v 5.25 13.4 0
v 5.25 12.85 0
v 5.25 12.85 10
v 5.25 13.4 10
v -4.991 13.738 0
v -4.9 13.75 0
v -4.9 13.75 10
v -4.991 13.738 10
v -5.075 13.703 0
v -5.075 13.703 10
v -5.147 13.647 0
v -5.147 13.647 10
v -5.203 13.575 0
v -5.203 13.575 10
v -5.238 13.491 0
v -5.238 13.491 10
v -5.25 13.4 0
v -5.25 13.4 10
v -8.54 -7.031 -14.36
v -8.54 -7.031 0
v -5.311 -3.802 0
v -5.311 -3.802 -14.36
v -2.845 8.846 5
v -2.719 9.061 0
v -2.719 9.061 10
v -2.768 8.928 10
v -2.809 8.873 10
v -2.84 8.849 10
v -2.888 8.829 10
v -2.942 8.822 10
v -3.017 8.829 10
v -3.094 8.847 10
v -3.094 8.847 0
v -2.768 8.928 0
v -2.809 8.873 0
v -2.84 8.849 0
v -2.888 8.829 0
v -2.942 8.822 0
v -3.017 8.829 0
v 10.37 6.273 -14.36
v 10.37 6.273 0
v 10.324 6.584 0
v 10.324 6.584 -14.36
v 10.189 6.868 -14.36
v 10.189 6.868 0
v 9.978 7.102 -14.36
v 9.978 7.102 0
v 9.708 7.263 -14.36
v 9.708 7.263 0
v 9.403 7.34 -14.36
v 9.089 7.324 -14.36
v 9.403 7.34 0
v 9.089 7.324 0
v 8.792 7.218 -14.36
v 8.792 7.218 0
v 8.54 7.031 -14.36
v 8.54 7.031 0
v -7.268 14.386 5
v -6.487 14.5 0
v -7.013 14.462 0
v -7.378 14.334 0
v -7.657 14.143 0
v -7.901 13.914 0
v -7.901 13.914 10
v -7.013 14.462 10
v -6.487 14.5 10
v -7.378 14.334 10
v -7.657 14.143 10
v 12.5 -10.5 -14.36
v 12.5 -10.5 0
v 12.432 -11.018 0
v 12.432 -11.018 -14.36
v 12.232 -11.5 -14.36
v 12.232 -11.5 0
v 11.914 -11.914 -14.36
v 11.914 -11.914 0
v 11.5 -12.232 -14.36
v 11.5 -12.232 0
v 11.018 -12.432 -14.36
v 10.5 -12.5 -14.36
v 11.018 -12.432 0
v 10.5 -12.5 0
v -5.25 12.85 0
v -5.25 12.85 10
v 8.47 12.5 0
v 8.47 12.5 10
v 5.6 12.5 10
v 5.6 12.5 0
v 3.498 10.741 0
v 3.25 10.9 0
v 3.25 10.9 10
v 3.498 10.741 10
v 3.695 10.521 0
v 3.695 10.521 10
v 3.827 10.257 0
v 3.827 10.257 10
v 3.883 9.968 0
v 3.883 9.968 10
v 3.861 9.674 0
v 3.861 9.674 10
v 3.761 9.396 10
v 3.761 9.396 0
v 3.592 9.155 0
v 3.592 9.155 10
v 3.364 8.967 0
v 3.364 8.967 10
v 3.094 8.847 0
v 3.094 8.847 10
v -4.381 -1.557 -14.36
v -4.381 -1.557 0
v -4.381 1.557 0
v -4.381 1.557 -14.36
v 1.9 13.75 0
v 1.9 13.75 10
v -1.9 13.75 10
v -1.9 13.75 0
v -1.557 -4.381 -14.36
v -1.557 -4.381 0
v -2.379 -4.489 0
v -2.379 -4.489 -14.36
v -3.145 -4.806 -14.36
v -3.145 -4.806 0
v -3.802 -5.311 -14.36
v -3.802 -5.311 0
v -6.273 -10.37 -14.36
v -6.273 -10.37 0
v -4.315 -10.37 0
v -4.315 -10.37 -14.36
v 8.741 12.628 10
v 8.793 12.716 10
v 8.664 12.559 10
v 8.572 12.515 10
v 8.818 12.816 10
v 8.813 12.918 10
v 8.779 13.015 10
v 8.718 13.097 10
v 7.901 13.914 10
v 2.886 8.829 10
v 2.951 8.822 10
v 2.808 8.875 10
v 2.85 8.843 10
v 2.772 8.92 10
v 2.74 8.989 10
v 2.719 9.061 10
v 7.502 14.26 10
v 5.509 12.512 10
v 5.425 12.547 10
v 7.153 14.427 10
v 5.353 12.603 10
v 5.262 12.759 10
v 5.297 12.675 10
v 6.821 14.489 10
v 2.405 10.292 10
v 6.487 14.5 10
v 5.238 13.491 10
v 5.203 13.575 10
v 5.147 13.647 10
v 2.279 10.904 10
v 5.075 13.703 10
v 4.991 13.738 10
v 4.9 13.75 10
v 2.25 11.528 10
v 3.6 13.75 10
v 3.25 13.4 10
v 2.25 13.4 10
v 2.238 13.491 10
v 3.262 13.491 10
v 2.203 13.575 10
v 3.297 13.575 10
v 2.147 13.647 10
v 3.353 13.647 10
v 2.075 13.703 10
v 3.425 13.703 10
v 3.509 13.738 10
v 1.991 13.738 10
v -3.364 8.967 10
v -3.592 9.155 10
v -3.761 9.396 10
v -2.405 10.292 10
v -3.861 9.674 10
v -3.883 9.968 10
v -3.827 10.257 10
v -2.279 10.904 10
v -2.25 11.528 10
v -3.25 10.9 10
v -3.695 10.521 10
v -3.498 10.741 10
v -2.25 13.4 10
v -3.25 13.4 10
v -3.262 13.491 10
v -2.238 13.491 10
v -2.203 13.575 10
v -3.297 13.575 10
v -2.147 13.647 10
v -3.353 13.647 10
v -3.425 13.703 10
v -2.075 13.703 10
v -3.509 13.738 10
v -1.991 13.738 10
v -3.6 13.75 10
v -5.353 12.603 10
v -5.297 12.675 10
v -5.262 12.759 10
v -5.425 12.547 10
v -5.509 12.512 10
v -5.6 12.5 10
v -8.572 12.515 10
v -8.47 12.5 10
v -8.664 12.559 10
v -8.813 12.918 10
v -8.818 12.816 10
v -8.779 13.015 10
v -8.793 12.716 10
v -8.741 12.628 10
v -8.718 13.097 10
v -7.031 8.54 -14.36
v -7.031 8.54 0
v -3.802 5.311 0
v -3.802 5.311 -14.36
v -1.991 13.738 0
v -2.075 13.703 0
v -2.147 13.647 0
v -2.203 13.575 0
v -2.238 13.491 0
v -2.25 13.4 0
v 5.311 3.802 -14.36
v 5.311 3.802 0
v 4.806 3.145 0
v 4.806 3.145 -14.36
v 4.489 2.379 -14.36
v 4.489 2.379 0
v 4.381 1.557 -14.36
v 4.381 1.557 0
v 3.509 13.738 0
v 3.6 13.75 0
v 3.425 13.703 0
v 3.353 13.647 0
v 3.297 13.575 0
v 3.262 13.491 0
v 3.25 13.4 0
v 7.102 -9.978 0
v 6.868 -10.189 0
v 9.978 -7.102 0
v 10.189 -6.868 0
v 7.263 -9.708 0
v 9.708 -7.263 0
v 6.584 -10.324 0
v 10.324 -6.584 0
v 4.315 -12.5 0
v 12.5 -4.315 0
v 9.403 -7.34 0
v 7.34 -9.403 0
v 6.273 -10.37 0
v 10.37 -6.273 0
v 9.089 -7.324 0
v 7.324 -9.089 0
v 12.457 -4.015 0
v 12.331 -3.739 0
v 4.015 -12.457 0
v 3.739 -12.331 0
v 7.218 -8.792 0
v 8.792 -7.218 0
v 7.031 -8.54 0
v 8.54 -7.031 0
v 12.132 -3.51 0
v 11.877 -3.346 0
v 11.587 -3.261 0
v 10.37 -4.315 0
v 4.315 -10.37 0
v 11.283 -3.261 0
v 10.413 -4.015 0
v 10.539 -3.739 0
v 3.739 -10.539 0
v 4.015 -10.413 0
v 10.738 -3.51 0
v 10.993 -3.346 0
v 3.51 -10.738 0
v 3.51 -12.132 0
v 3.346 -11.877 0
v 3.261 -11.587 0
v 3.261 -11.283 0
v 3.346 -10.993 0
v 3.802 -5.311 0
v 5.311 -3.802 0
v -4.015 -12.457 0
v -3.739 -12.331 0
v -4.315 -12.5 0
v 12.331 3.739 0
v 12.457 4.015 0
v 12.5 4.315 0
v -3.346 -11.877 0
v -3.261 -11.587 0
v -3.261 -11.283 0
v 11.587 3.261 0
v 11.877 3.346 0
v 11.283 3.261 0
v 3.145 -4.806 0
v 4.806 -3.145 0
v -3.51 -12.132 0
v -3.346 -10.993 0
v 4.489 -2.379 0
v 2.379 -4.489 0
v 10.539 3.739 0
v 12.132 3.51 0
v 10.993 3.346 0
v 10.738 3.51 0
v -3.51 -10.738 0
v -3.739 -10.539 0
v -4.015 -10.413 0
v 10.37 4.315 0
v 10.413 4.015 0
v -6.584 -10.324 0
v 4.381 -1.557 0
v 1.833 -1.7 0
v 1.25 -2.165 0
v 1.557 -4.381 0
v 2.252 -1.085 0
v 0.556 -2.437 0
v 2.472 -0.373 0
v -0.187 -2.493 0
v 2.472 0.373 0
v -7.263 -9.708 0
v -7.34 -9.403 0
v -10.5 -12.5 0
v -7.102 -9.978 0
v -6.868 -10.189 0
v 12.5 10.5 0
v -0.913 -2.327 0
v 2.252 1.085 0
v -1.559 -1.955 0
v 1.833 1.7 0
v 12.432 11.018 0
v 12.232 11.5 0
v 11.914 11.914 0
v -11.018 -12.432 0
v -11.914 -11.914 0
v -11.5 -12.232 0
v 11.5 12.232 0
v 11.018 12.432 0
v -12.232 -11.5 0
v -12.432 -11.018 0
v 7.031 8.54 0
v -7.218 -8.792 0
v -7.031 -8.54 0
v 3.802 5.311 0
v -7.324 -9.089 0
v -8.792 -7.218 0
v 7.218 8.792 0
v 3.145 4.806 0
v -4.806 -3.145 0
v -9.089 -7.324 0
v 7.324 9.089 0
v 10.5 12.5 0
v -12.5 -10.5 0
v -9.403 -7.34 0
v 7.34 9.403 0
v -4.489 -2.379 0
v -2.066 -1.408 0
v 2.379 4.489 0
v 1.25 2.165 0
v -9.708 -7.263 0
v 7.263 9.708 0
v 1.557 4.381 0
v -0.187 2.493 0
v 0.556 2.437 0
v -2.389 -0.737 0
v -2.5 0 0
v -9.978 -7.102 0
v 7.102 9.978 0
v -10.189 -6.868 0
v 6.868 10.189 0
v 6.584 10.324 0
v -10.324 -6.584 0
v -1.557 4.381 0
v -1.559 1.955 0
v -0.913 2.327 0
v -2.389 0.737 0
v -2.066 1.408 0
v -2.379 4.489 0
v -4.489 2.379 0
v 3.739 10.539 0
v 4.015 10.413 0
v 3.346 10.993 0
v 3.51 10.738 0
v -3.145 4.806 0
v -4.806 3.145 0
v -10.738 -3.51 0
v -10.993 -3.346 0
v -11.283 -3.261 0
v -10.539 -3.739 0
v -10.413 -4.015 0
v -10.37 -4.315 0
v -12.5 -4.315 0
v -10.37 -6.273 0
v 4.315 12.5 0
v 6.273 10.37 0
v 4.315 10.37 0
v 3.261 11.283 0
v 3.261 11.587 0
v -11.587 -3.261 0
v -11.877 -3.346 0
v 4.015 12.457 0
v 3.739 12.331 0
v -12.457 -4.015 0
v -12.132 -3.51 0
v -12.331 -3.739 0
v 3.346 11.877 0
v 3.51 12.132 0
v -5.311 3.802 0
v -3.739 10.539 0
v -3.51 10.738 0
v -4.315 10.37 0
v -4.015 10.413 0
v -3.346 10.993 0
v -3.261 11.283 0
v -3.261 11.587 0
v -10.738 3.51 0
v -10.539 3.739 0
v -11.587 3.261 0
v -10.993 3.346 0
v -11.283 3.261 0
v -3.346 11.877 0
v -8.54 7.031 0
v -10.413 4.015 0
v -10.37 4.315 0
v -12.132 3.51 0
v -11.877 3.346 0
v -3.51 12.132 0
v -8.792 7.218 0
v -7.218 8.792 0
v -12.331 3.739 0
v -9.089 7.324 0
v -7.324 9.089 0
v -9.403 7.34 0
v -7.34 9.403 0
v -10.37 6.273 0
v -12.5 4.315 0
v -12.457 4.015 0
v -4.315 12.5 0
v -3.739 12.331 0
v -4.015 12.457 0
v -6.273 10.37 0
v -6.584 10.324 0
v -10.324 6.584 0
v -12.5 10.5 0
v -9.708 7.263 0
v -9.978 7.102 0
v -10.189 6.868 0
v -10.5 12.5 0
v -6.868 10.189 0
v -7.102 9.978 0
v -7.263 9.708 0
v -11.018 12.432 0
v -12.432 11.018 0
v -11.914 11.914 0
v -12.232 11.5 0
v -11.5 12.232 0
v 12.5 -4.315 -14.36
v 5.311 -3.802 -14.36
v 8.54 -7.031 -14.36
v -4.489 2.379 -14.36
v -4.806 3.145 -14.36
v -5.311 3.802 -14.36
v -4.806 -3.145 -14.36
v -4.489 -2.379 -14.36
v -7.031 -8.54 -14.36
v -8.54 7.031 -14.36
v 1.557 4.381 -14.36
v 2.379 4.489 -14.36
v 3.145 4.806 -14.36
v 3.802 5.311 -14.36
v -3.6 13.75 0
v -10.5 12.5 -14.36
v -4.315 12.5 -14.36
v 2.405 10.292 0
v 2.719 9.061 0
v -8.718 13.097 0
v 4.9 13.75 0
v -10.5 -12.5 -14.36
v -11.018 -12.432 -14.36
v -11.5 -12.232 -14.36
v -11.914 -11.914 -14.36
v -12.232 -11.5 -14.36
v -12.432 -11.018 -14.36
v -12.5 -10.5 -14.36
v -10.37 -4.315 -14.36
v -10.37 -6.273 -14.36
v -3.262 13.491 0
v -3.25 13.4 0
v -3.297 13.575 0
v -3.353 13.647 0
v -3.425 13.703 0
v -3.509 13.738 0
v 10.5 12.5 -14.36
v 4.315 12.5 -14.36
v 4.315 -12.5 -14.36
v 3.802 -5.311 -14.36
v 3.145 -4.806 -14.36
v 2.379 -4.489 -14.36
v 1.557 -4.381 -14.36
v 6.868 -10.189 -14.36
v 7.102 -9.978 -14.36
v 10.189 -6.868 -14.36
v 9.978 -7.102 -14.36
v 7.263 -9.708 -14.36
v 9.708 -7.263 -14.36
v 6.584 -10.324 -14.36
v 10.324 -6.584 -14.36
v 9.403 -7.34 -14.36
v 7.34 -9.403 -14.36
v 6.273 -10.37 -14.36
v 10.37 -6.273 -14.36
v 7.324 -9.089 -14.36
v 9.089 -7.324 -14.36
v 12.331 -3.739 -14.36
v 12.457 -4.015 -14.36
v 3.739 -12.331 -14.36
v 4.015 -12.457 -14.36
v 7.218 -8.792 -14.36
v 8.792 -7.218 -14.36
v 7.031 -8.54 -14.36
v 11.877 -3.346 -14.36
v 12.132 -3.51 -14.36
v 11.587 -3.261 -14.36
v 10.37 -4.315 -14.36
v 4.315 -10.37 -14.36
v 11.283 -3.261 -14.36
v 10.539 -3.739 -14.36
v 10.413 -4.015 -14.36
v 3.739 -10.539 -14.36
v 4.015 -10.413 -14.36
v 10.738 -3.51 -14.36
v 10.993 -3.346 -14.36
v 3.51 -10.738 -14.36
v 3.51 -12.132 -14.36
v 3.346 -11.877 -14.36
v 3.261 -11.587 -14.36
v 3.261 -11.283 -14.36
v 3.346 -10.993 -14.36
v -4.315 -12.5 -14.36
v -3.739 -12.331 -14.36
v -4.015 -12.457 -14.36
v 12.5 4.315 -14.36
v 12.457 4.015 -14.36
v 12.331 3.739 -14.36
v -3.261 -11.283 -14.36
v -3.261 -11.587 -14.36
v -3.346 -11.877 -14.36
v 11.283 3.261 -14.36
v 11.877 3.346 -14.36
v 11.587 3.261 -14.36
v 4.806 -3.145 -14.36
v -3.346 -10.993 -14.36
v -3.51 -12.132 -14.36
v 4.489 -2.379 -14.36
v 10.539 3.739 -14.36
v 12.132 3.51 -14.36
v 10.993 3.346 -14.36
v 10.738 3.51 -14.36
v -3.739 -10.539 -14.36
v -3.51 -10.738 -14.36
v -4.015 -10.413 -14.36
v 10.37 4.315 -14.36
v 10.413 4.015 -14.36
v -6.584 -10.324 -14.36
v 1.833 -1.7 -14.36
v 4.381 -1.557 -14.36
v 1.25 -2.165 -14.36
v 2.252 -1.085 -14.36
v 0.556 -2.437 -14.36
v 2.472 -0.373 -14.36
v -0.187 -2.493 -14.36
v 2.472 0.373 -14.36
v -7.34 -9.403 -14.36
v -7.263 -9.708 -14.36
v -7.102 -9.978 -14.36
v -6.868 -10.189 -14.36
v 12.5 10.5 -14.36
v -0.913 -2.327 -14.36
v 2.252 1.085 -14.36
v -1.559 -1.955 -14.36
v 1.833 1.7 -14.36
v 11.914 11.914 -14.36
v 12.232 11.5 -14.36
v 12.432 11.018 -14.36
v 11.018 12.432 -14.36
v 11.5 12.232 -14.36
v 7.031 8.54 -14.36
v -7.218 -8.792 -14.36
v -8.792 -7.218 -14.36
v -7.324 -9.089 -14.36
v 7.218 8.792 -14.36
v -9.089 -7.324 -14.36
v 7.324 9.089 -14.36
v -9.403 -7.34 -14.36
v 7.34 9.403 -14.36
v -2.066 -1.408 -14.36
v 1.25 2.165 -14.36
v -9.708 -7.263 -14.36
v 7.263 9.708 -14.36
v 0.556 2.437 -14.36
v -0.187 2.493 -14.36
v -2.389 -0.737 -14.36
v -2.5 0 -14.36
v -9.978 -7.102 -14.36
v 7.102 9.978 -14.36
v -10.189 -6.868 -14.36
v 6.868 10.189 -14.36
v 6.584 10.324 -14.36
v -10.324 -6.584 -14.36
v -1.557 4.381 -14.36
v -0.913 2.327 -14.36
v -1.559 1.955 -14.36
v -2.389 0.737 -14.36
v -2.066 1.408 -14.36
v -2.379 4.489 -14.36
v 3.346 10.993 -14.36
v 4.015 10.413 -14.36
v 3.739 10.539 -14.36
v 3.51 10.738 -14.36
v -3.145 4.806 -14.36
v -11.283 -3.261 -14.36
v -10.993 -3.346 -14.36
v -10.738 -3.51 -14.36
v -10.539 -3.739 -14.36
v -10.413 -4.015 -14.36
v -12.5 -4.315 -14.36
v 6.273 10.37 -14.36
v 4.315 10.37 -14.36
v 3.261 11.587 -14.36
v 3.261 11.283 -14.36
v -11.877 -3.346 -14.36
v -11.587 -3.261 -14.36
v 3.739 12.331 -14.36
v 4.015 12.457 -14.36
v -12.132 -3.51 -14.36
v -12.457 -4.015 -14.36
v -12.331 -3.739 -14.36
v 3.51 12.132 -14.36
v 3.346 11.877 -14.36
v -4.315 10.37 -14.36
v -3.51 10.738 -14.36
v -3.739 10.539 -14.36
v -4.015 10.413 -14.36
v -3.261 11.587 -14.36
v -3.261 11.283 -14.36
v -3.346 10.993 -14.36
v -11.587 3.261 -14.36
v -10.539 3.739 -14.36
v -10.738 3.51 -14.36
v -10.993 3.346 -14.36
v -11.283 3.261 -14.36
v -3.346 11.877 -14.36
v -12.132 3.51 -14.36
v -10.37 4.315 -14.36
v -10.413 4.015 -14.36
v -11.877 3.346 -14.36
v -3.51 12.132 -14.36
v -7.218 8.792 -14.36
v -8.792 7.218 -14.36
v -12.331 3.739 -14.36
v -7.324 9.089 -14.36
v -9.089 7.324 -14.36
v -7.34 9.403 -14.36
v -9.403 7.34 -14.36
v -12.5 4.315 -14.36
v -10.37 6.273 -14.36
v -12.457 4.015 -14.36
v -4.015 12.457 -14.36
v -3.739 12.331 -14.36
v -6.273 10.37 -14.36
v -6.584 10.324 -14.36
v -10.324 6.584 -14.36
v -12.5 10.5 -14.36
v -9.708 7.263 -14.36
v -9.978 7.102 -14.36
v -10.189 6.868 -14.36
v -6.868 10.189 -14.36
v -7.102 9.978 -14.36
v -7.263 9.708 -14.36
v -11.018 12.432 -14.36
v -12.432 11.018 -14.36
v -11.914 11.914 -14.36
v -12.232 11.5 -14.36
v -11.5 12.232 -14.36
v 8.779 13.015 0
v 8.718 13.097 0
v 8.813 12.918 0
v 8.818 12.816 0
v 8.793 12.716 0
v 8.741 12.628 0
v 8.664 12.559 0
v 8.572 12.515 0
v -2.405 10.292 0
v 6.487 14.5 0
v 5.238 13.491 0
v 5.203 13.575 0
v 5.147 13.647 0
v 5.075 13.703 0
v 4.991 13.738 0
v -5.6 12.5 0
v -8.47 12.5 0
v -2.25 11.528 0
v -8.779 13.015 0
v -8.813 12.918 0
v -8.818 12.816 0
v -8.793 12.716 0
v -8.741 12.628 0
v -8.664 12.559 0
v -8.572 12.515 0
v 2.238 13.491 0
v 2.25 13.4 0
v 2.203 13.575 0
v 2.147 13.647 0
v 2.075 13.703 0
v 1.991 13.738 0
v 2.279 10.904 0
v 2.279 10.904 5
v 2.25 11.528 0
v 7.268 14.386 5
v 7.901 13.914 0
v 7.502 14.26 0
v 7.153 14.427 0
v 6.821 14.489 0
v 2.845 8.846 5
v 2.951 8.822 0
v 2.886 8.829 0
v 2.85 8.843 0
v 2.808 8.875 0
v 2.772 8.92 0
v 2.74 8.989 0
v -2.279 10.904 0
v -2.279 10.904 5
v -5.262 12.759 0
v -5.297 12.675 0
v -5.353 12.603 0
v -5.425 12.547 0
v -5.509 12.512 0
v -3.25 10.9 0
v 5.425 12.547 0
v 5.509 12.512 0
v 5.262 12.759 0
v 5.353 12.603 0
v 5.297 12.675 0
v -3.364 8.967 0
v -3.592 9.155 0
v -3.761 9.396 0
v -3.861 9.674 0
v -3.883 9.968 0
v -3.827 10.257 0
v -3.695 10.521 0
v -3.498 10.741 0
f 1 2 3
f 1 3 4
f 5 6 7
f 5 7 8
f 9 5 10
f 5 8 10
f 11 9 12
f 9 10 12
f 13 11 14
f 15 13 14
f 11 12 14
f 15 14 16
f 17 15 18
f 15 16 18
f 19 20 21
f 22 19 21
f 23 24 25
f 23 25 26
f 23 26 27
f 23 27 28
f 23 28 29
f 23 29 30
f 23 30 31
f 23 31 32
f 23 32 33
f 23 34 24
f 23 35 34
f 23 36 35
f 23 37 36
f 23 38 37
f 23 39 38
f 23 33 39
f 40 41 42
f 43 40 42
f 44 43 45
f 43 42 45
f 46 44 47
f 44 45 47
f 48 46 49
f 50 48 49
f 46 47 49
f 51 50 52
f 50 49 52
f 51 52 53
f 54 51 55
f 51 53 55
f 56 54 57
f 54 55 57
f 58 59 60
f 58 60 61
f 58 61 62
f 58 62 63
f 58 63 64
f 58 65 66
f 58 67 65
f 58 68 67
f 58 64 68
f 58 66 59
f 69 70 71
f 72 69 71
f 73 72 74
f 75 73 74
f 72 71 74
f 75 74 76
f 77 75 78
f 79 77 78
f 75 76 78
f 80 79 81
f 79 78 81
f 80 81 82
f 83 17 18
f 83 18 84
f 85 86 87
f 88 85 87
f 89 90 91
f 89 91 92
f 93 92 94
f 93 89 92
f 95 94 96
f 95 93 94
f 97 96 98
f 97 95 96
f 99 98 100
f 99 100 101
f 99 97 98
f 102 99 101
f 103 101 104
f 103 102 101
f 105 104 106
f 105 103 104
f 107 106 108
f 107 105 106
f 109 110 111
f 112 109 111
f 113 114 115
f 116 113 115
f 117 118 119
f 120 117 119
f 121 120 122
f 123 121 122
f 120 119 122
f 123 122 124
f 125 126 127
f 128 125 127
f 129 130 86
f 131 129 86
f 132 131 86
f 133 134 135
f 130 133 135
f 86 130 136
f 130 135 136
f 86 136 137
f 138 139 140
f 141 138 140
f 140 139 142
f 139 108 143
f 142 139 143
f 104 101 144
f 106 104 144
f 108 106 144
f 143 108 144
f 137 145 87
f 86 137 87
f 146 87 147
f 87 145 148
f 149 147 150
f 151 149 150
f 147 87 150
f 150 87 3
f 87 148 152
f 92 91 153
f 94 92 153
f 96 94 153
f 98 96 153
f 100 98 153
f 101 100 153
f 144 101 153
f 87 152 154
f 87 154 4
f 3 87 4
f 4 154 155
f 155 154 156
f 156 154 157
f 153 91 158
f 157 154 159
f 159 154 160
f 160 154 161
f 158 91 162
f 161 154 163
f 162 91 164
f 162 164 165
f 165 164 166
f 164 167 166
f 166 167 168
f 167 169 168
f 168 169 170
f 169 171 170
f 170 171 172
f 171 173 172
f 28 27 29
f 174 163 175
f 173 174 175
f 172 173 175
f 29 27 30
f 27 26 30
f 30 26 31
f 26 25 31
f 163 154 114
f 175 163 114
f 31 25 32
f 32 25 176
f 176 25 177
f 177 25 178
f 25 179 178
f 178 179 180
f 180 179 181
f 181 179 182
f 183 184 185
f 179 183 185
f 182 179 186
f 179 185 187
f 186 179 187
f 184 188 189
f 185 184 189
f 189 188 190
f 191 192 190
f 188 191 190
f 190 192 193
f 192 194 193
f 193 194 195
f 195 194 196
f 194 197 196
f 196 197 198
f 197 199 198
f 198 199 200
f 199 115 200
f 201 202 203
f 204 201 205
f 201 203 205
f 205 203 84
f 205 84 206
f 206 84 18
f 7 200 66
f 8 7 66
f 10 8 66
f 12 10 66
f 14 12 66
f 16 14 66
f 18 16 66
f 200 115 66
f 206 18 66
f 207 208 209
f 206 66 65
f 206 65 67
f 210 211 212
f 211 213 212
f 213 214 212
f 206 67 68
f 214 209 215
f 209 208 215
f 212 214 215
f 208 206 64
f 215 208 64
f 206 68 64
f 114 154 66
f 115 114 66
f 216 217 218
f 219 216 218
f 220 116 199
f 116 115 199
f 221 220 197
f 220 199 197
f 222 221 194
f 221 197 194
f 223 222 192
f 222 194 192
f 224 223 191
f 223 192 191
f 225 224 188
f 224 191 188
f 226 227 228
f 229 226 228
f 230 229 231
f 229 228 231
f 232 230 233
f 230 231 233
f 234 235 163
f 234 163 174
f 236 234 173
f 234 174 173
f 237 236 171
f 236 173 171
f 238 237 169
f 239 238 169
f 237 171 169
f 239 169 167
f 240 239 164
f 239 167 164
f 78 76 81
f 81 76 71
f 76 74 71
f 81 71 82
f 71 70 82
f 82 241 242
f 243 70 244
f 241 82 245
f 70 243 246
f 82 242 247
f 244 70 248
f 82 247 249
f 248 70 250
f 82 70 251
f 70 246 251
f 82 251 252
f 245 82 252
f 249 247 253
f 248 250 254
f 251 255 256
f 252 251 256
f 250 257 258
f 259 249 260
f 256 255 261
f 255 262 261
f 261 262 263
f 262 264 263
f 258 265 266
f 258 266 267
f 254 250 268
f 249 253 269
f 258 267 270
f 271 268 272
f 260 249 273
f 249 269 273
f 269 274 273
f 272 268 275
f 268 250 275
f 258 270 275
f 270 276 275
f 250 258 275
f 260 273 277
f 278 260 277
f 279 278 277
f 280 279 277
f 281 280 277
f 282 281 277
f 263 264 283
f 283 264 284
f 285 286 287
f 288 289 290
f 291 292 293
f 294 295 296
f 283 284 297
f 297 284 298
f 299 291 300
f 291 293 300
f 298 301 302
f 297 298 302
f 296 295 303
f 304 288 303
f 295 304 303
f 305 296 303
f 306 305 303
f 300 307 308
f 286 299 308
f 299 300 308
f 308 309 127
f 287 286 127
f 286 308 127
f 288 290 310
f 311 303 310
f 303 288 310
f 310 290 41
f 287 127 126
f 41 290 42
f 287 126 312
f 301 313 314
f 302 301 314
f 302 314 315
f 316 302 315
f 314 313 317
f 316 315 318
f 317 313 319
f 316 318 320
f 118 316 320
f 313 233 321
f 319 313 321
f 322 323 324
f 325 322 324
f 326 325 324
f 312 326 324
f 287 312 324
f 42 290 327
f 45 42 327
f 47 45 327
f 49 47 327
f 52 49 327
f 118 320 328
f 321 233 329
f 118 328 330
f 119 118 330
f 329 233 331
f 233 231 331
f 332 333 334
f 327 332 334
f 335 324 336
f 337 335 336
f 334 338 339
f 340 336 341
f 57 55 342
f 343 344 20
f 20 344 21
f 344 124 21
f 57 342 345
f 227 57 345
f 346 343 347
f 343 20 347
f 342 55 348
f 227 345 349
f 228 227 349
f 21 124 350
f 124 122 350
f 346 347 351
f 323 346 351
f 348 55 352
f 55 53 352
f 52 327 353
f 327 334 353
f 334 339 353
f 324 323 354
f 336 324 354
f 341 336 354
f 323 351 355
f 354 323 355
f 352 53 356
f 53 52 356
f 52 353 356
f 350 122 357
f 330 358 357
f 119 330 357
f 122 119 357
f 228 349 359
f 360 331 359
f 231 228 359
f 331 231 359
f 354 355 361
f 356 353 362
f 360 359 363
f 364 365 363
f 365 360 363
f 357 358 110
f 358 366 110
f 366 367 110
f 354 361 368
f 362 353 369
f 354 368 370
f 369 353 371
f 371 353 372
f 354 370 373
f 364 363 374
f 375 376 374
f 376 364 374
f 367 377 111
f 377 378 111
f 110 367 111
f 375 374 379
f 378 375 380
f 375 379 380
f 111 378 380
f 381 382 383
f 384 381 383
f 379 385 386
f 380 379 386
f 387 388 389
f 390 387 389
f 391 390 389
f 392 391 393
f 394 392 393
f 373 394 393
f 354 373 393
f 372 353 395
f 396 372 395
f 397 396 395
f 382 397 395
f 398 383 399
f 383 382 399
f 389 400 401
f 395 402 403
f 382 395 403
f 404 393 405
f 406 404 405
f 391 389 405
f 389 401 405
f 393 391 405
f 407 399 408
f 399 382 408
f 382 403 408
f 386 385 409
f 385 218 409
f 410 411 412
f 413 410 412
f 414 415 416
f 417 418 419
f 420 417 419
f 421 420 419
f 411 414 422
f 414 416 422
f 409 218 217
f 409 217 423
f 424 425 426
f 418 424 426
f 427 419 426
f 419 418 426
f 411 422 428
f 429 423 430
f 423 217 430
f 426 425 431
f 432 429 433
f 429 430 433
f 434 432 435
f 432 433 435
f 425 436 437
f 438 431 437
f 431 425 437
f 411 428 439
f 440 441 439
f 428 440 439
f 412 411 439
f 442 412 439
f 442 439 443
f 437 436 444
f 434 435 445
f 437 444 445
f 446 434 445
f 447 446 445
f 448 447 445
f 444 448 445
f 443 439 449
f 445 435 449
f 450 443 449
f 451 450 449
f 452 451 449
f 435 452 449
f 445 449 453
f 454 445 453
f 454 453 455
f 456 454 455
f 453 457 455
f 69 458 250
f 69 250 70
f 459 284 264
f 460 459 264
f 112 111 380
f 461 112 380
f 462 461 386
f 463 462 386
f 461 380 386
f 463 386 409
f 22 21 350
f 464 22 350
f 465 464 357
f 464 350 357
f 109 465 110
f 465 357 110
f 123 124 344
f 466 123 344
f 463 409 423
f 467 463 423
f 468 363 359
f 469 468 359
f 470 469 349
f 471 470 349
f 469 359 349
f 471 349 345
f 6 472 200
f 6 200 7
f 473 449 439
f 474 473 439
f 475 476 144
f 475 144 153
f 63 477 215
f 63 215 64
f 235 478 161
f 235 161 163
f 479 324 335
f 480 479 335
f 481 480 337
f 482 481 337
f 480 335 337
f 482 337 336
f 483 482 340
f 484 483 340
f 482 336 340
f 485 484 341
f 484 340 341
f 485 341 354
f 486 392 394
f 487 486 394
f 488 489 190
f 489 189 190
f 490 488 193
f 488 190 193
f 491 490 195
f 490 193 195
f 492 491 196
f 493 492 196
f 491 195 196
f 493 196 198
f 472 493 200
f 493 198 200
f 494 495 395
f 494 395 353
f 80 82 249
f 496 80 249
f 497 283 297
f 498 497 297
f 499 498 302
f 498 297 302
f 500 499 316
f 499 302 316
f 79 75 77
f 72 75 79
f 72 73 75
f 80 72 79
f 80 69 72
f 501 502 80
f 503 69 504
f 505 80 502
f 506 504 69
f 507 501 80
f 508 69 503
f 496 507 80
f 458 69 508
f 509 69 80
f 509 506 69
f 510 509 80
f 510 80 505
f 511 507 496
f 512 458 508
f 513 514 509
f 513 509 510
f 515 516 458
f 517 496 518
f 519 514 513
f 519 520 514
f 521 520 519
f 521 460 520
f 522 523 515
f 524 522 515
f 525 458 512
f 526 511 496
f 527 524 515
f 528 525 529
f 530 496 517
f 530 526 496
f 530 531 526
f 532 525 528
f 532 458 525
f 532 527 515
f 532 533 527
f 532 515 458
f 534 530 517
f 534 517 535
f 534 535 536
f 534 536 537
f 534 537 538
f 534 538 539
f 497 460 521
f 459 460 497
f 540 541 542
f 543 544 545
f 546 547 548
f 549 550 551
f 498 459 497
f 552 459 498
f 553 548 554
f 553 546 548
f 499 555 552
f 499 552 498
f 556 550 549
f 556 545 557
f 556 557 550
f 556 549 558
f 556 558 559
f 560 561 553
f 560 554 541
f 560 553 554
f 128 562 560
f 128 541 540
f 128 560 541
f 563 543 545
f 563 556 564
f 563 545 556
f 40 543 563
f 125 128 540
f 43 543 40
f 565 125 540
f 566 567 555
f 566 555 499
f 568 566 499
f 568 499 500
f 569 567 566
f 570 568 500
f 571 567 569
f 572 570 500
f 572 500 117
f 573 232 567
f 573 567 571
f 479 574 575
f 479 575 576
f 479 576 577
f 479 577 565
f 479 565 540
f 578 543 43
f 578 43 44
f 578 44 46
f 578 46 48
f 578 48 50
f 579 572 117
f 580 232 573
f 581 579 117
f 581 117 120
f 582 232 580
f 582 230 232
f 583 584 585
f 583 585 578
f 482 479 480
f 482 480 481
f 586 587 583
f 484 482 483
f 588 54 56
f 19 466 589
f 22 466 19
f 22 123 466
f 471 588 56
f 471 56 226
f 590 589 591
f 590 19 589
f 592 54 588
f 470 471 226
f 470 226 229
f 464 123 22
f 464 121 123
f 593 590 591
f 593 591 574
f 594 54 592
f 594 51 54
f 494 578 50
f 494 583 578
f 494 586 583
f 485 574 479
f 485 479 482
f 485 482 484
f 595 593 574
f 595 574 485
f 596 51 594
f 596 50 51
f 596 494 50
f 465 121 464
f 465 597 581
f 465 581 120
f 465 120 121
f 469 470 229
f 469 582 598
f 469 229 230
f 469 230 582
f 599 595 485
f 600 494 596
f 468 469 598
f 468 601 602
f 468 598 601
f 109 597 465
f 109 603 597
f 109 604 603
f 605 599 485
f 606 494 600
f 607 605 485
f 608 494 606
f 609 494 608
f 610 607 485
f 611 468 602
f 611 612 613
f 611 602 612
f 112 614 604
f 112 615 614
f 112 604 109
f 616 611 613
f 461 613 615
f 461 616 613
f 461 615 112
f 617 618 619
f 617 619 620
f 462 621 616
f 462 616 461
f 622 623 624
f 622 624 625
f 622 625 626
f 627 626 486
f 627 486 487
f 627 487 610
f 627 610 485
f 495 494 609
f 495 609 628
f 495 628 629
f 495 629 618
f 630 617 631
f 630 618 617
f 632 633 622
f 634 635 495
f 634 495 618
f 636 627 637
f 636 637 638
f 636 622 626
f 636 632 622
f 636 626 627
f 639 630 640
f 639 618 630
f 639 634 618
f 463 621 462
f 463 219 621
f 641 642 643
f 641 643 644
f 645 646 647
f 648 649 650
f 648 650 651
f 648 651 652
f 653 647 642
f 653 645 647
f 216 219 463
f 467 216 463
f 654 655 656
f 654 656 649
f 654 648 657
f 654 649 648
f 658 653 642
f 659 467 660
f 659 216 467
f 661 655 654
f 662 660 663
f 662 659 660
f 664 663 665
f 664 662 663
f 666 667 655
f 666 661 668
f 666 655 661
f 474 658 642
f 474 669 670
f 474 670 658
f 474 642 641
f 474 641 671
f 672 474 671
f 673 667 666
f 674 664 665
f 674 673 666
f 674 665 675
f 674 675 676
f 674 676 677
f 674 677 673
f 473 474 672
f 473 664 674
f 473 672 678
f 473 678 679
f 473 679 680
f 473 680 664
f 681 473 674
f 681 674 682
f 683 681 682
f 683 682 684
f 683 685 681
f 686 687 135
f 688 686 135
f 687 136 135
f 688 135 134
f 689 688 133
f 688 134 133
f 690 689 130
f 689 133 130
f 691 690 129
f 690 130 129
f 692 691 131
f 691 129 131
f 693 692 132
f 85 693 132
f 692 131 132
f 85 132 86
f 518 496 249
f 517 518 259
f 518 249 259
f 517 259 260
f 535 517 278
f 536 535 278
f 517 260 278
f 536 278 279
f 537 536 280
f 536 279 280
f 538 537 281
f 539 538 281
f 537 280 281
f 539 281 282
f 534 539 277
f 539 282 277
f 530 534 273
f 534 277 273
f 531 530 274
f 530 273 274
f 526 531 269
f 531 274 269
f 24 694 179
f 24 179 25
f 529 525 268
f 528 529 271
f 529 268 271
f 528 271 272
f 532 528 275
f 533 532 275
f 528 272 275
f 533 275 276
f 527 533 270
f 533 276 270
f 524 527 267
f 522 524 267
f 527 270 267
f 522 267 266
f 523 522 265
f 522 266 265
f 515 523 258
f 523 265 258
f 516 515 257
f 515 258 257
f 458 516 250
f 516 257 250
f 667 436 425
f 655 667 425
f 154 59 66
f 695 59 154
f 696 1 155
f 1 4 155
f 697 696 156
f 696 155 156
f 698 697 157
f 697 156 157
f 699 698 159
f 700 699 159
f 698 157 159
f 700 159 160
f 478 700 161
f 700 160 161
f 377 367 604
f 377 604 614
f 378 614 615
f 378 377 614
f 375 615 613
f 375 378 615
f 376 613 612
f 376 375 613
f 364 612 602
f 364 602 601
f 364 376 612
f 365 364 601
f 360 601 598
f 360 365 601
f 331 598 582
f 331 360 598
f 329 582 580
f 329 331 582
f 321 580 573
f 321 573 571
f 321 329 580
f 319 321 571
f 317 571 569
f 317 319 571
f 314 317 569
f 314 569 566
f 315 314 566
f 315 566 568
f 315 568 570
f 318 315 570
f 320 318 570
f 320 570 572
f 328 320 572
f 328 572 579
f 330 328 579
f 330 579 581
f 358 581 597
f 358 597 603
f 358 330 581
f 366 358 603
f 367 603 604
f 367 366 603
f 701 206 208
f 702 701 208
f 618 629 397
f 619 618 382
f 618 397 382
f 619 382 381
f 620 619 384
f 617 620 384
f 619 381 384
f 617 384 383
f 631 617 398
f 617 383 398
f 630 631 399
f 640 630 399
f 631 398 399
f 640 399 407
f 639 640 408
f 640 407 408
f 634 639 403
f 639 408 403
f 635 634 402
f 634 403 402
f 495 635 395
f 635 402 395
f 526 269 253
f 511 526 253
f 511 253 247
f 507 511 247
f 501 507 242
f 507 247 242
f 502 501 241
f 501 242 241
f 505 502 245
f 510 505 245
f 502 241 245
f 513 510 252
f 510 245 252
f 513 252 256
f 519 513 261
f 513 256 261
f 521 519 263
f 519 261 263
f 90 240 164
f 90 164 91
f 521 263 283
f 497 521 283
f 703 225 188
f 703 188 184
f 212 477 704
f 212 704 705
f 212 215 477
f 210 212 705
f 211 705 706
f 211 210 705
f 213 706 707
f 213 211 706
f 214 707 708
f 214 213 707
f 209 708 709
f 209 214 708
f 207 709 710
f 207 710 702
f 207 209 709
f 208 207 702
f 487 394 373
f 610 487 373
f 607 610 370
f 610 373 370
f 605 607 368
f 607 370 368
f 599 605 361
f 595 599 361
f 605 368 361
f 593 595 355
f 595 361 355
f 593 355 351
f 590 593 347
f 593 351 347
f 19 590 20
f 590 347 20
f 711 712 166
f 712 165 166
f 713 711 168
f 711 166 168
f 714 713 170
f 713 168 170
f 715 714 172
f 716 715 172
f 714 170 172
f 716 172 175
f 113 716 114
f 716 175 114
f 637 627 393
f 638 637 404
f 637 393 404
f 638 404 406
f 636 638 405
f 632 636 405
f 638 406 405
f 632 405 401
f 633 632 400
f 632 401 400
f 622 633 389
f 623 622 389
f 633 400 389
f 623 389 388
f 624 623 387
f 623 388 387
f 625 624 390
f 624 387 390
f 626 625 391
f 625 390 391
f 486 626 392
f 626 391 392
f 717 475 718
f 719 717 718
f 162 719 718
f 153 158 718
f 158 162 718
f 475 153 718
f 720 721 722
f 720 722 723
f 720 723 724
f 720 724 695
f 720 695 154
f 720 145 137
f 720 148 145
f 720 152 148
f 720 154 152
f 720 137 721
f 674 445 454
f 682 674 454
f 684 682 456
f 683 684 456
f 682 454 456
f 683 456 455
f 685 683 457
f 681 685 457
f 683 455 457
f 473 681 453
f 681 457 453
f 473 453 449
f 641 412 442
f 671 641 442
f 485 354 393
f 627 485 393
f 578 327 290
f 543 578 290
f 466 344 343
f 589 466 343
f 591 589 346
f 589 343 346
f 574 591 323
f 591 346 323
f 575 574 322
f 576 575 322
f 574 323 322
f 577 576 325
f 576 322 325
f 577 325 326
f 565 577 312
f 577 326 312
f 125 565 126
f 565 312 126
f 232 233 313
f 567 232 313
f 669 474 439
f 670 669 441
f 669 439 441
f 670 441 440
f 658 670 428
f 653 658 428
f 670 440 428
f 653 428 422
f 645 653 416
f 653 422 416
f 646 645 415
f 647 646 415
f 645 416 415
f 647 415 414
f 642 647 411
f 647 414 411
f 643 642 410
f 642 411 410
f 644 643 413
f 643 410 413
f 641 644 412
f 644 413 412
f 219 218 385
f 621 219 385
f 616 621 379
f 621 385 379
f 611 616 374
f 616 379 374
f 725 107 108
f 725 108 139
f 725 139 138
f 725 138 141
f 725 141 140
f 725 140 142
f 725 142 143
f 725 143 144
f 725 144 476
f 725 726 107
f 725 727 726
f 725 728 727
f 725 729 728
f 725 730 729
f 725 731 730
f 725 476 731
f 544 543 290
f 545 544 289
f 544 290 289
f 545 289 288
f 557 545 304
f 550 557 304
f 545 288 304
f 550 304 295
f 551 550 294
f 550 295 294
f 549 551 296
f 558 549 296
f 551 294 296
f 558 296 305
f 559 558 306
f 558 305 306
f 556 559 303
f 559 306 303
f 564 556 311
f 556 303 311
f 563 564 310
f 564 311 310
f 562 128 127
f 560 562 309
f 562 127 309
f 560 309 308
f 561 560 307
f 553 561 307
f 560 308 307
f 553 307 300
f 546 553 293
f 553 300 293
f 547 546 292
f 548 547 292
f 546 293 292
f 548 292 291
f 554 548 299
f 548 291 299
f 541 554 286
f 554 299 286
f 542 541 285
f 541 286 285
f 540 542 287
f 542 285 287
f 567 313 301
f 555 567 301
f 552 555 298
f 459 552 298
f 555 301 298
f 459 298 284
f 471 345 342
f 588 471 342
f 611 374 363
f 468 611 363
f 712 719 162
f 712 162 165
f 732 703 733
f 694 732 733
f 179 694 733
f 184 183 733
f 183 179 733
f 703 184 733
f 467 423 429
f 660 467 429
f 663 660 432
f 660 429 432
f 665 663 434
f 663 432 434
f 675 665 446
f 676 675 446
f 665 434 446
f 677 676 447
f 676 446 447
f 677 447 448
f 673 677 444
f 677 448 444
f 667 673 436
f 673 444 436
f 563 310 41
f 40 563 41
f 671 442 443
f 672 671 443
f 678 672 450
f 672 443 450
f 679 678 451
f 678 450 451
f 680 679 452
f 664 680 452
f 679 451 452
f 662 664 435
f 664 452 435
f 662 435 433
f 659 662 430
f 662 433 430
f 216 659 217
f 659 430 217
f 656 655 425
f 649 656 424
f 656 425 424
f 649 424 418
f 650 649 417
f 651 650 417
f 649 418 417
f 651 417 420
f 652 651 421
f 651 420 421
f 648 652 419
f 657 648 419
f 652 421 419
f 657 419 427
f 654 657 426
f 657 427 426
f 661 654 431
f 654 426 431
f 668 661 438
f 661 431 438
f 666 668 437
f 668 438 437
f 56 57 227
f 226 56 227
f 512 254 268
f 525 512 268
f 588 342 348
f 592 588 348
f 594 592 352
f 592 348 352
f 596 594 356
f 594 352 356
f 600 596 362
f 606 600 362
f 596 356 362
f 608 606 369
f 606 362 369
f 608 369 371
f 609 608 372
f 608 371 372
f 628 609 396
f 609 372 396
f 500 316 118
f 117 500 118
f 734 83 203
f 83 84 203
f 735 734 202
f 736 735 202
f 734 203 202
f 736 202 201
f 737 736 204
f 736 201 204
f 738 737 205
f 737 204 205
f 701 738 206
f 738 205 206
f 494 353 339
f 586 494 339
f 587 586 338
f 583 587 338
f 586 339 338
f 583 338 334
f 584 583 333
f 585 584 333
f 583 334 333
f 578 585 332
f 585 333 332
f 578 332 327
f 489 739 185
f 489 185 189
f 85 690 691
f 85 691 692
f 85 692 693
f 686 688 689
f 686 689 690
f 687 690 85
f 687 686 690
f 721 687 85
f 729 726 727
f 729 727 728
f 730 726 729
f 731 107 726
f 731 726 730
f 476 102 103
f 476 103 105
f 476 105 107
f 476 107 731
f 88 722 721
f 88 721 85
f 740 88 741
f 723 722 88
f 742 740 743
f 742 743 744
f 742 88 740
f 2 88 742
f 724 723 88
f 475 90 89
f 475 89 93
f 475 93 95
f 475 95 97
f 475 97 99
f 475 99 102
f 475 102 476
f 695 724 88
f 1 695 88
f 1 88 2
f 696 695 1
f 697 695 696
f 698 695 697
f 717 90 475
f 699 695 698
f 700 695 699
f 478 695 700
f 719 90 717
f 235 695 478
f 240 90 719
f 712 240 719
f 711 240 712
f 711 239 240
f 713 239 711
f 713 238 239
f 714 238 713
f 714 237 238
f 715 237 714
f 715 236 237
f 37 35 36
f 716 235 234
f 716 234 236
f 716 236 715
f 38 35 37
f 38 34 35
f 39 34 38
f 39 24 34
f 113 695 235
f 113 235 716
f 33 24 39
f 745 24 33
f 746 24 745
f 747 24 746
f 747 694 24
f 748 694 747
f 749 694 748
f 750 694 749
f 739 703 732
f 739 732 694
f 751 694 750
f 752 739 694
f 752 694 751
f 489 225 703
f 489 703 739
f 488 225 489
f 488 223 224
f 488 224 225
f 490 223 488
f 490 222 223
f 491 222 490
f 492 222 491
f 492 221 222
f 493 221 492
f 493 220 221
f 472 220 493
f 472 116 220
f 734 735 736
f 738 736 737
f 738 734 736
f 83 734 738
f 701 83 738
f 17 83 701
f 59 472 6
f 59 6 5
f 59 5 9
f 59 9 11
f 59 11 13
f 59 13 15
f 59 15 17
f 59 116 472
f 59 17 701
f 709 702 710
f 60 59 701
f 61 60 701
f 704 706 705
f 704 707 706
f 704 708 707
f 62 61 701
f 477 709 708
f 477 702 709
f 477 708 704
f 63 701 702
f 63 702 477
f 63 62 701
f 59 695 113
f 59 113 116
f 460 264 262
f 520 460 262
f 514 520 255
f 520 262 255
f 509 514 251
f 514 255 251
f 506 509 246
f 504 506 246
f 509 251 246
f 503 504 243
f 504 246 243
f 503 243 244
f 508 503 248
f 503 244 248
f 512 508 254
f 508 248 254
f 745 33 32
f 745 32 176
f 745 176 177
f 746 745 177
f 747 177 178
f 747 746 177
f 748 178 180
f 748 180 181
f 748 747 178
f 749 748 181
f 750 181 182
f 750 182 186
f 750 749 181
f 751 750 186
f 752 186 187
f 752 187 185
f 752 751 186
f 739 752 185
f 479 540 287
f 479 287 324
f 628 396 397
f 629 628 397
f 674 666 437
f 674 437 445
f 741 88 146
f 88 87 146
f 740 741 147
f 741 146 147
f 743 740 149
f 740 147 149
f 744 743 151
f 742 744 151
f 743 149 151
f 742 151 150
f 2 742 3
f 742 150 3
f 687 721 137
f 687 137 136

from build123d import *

# Parameters (mm, degrees)
SKETCH11_R                             = 2.5
F_25_SERIES_EXTRUSIONS_25_2525_1_DEPTH = 14.359821885
BOSS_EXTRUDE1_DEPTH                    = 10
FILLET1_R                              = 0.35
FILLET4_DEPTH                          = 10


with BuildPart() as part:
    # Sketch11 → 25 series extrusions 25-2525(1) (new body)
    with BuildSketch(Plane(origin=(0, 0, 0), x_dir=(-1, 0, 0), z_dir=(0, 0, -1))):
        with BuildLine():
            Line((12.5, -10.5), (12.5, -4.315))
            ThreePointArc((12.5, -4.315), (11.435, -3.25), (10.37, -4.315))
            Line((10.37, -4.315), (10.37, -6.272801987))
            ThreePointArc((10.37, -6.272801987), (9.708114403, -7.263383786), (8.539643501, -7.030960473))
            Line((8.539643501, -7.030960473), (5.311043881, -3.802360852))
            ThreePointArc((5.311043881, -3.802360852), (4.622790395, -2.77231672), (4.381107911, -1.557296822))
            Line((4.381107911, -1.557296822), (4.381107911, 1.557296822))
            ThreePointArc((4.381107911, 1.557296822), (4.622790395, 2.77231672), (5.311043881, 3.802360852))
            Line((5.311043881, 3.802360852), (8.539643501, 7.030960473))
            ThreePointArc((8.539643501, 7.030960473), (9.708114403, 7.263383786), (10.37, 6.272801987))
            Line((10.37, 6.272801987), (10.37, 4.315))
            ThreePointArc((10.37, 4.315), (11.435, 3.25), (12.5, 4.315))
            Line((12.5, 4.315), (12.5, 10.5))
            ThreePointArc((12.5, 10.5), (11.914213562, 11.914213562), (10.5, 12.5))
            Line((10.5, 12.5), (4.315, 12.5))
            ThreePointArc((4.315, 12.5), (3.25, 11.435), (4.315, 10.37))
            Line((4.315, 10.37), (6.272801987, 10.37))
            ThreePointArc((6.272801987, 10.37), (7.263383786, 9.708114403), (7.030960473, 8.539643501))
            Line((7.030960473, 8.539643501), (3.802360852, 5.311043881))
            ThreePointArc((3.802360852, 5.311043881), (2.77231672, 4.622790395), (1.557296822, 4.381107911))
            Line((1.557296822, 4.381107911), (-1.557296822, 4.381107911))
            ThreePointArc((-1.557296822, 4.381107911), (-2.77231672, 4.622790395), (-3.802360852, 5.311043881))
            Line((-3.802360852, 5.311043881), (-7.030960473, 8.539643501))
            ThreePointArc((-7.030960473, 8.539643501), (-7.263383786, 9.708114403), (-6.272801987, 10.37))
            Line((-6.272801987, 10.37), (-4.315, 10.37))
            ThreePointArc((-4.315, 10.37), (-3.25, 11.435), (-4.315, 12.5))
            Line((-4.315, 12.5), (-10.5, 12.5))
            ThreePointArc((-10.5, 12.5), (-11.914213562, 11.914213562), (-12.5, 10.5))
            Line((-12.5, 10.5), (-12.5, 4.315))
            ThreePointArc((-12.5, 4.315), (-11.435, 3.25), (-10.37, 4.315))
            Line((-10.37, 4.315), (-10.37, 6.272801987))
            ThreePointArc((-10.37, 6.272801987), (-9.708114403, 7.263383786), (-8.539643501, 7.030960473))
            Line((-8.539643501, 7.030960473), (-5.311043881, 3.802360852))
            ThreePointArc((-5.311043881, 3.802360852), (-4.622790395, 2.77231672), (-4.381107911, 1.557296822))
            Line((-4.381107911, 1.557296822), (-4.381107911, -1.557296822))
            ThreePointArc((-4.381107911, -1.557296822), (-4.622790395, -2.77231672), (-5.311043881, -3.802360852))
            Line((-5.311043881, -3.802360852), (-8.539643501, -7.030960473))
            ThreePointArc((-8.539643501, -7.030960473), (-9.708114403, -7.263383786), (-10.37, -6.272801987))
            Line((-10.37, -6.272801987), (-10.37, -4.315))
            ThreePointArc((-10.37, -4.315), (-11.435, -3.25), (-12.5, -4.315))
            Line((-12.5, -4.315), (-12.5, -10.5))
            ThreePointArc((-12.5, -10.5), (-11.914213562, -11.914213562), (-10.5, -12.5))
            Line((-10.5, -12.5), (-4.315, -12.5))
            ThreePointArc((-4.315, -12.5), (-3.25, -11.435), (-4.315, -10.37))
            Line((-4.315, -10.37), (-6.272801987, -10.37))
            ThreePointArc((-6.272801987, -10.37), (-7.263383786, -9.708114403), (-7.030960473, -8.539643501))
            Line((-7.030960473, -8.539643501), (-3.802360852, -5.311043881))
            ThreePointArc((-3.802360852, -5.311043881), (-2.77231672, -4.622790395), (-1.557296822, -4.381107911))
            Line((-1.557296822, -4.381107911), (1.557296822, -4.381107911))
            ThreePointArc((1.557296822, -4.381107911), (2.77231672, -4.622790395), (3.802360852, -5.311043881))
            Line((3.802360852, -5.311043881), (7.030960473, -8.539643501))
            ThreePointArc((7.030960473, -8.539643501), (7.263383786, -9.708114403), (6.272801987, -10.37))
            Line((6.272801987, -10.37), (4.315, -10.37))
            ThreePointArc((4.315, -10.37), (3.25, -11.435), (4.315, -12.5))
            Line((4.315, -12.5), (10.5, -12.5))
            ThreePointArc((10.5, -12.5), (11.914213562, -11.914213562), (12.5, -10.5))
        make_face()
        Circle(SKETCH11_R, mode=Mode.SUBTRACT)
    extrude(amount=F_25_SERIES_EXTRUSIONS_25_2525_1_DEPTH)


with BuildPart() as body_2:
    # Sketch14 → Boss-Extrude1 (new body)
    with BuildSketch(Plane.XY):
        with BuildLine():
            Line((-9.315, 12.5), (-7.315, 14.5))
            Line((-7.315, 14.5), (7.315, 14.5))
            Line((7.315, 14.5), (9.315, 12.5))
            Line((9.315, 12.5), (5.25, 12.5))
            Line((5.25, 12.5), (5.25, 13.75))
            Line((5.25, 13.75), (3.25, 13.75))
            Line((3.25, 13.75), (3.25, 10.9))
            ThreePointArc((3.25, 10.9), (3.859144243, 9.66498424), (2.785208105, 8.803020314))
            Line((2.785208105, 8.803020314), (2.25, 10.9))
            Line((2.25, 10.9), (2.25, 13.75))
            Line((2.25, 13.75), (-2.25, 13.75))
            Line((-2.25, 13.75), (-2.25, 10.9))
            Line((-2.25, 10.9), (-2.785208105, 8.803020314))
            ThreePointArc((-2.785208105, 8.803020314), (-3.859144243, 9.66498424), (-3.25, 10.9))
            Line((-3.25, 10.9), (-3.25, 13.75))
            Line((-3.25, 13.75), (-5.25, 13.75))
            Line((-5.25, 13.75), (-5.25, 12.5))
            Line((-5.25, 12.5), (-9.315, 12.5))
        make_face()
    extrude(amount=BOSS_EXTRUDE1_DEPTH)

    # Fillet1
    fillet1_edges = [body_2.edges().sort_by_distance(p)[0] for p in [
        (-9.315, 12.5, 5),
        (9.315, 12.5, 5),
        (5.25, 12.5, 5),
        (5.25, 13.75, 5),
        (3.25, 13.75, 5),
        (2.25, 13.75, 5),
        (-2.25, 13.75, 5),
        (-3.25, 13.75, 5),
        (-5.25, 13.75, 5),
        (-5.25, 12.5, 5),
    ]]
    fillet(fillet1_edges, radius=FILLET1_R)

    # Fillet2
    # a fillet whose section is not a circle: 2 mm, written as the material it takes off along each edge
    with BuildSketch(Plane(origin=(-7.315, 14.5, -2.071067812), x_dir=(-0.7071067811865508, -0.7071067811865444, 0), z_dir=(0, 0, 1)), Plane(origin=(7.315, 14.5, -2.071067812), x_dir=(-1, 0, 0), z_dir=(0, 0, 1))) as fillet2_piece_1:
        with BuildLine():
            add(Edge.make_bspline([(0.828427125, 0), (0.676784525, 0), (0.525141925, 0), (0.186837399, 0.028463796), (-0.111987048, 0.152240935), (-0.371331417, 0.371331417), (-0.478558927, 0.478558927), (-0.585786438, 0.585786438)], knots=[0, 0, 0, 0, 0, 0, 0.5, 0.5, 1, 1, 1, 1, 1, 1], degree=5))
            Line((-0.585786438, 0.585786438), (0, 0))
            Line((0, 0), (0.828427125, 0))
        make_face()
    extrude(amount=14.142135624, mode=Mode.SUBTRACT)

    # Fillet3
    # a fillet whose section is not a circle: 5 mm, written as the material it takes off along each edge
    with BuildSketch(Plane(origin=(2.25, 10.9, -1.570010707), x_dir=(0, 1, 0), z_dir=(0, 0, 1)), Plane(origin=(-2.25, 10.9, -1.570010707), x_dir=(-0.24730040696589287, -0.9689388570567824, 0), z_dir=(0, 0, 1))) as fillet3_piece_1:
        with BuildLine():
            add(Edge.make_bspline([(0.628004283, 0), (0.510529941, 0), (0.3930556, 0), (0.131844663, -0.006577423), (-0.126122818, -0.03897836), (-0.380846844, -0.09720281), (-0.494672298, -0.126254262), (-0.608497752, -0.155305715)], knots=[0, 0, 0, 0, 0, 0, 0.5, 0.5, 1, 1, 1, 1, 1, 1], degree=5))
            Line((-0.608497752, -0.155305715), (0, 0))
            Line((0, 0), (0.628004283, 0))
        make_face()
    extrude(amount=13.140021414, mode=Mode.SUBTRACT)

    # Fillet4: read off the stored shape, not the designer's step
    # Fillet4 outline → Fillet4 (cut)
    with BuildSketch(Plane.XY):
        with BuildLine():
            ThreePointArc((2.785208105, 8.803020314), (2.941353117, 8.814159104), (3.094335826, 8.847349886))
            add(Edge.make_bspline(
                [(3.094335826, 8.847349886), (3.040436849, 8.831566866), (2.986247473, 8.819433643), (2.879523937, 8.809590473), (2.797123937, 8.853068941), (2.74504319, 8.960389027), (2.7321949, 9.010729454), (2.719346609, 9.061069881)],
                knots=[0, 0, 0, 0, 0, 0, 0.5, 0.5, 1, 1, 1, 1, 1, 1], degree=5))
            Line((2.719346609, 9.061069881), (2.785208105, 8.803020314))
        make_face()
        with BuildLine():
            Line((-2.785208105, 8.803020314), (-2.719346609, 9.061069881))
            add(Edge.make_bspline(
                [(-2.719346609, 9.061069881), (-2.7321949, 9.010729454), (-2.74504319, 8.960389027), (-2.797123937, 8.853068941), (-2.879523937, 8.809590473), (-2.986247473, 8.819433643), (-3.040436849, 8.831566866), (-3.094335826, 8.847349886)],
                knots=[0, 0, 0, 0, 0, 0, 0.5, 0.5, 1, 1, 1, 1, 1, 1], degree=5))
            ThreePointArc((-3.094335826, 8.847349886), (-2.941353117, 8.814159104), (-2.785208105, 8.803020314))
        make_face()
    extrude(amount=FILLET4_DEPTH, mode=Mode.SUBTRACT)


solid = Compound([part.part, body_2.part])
